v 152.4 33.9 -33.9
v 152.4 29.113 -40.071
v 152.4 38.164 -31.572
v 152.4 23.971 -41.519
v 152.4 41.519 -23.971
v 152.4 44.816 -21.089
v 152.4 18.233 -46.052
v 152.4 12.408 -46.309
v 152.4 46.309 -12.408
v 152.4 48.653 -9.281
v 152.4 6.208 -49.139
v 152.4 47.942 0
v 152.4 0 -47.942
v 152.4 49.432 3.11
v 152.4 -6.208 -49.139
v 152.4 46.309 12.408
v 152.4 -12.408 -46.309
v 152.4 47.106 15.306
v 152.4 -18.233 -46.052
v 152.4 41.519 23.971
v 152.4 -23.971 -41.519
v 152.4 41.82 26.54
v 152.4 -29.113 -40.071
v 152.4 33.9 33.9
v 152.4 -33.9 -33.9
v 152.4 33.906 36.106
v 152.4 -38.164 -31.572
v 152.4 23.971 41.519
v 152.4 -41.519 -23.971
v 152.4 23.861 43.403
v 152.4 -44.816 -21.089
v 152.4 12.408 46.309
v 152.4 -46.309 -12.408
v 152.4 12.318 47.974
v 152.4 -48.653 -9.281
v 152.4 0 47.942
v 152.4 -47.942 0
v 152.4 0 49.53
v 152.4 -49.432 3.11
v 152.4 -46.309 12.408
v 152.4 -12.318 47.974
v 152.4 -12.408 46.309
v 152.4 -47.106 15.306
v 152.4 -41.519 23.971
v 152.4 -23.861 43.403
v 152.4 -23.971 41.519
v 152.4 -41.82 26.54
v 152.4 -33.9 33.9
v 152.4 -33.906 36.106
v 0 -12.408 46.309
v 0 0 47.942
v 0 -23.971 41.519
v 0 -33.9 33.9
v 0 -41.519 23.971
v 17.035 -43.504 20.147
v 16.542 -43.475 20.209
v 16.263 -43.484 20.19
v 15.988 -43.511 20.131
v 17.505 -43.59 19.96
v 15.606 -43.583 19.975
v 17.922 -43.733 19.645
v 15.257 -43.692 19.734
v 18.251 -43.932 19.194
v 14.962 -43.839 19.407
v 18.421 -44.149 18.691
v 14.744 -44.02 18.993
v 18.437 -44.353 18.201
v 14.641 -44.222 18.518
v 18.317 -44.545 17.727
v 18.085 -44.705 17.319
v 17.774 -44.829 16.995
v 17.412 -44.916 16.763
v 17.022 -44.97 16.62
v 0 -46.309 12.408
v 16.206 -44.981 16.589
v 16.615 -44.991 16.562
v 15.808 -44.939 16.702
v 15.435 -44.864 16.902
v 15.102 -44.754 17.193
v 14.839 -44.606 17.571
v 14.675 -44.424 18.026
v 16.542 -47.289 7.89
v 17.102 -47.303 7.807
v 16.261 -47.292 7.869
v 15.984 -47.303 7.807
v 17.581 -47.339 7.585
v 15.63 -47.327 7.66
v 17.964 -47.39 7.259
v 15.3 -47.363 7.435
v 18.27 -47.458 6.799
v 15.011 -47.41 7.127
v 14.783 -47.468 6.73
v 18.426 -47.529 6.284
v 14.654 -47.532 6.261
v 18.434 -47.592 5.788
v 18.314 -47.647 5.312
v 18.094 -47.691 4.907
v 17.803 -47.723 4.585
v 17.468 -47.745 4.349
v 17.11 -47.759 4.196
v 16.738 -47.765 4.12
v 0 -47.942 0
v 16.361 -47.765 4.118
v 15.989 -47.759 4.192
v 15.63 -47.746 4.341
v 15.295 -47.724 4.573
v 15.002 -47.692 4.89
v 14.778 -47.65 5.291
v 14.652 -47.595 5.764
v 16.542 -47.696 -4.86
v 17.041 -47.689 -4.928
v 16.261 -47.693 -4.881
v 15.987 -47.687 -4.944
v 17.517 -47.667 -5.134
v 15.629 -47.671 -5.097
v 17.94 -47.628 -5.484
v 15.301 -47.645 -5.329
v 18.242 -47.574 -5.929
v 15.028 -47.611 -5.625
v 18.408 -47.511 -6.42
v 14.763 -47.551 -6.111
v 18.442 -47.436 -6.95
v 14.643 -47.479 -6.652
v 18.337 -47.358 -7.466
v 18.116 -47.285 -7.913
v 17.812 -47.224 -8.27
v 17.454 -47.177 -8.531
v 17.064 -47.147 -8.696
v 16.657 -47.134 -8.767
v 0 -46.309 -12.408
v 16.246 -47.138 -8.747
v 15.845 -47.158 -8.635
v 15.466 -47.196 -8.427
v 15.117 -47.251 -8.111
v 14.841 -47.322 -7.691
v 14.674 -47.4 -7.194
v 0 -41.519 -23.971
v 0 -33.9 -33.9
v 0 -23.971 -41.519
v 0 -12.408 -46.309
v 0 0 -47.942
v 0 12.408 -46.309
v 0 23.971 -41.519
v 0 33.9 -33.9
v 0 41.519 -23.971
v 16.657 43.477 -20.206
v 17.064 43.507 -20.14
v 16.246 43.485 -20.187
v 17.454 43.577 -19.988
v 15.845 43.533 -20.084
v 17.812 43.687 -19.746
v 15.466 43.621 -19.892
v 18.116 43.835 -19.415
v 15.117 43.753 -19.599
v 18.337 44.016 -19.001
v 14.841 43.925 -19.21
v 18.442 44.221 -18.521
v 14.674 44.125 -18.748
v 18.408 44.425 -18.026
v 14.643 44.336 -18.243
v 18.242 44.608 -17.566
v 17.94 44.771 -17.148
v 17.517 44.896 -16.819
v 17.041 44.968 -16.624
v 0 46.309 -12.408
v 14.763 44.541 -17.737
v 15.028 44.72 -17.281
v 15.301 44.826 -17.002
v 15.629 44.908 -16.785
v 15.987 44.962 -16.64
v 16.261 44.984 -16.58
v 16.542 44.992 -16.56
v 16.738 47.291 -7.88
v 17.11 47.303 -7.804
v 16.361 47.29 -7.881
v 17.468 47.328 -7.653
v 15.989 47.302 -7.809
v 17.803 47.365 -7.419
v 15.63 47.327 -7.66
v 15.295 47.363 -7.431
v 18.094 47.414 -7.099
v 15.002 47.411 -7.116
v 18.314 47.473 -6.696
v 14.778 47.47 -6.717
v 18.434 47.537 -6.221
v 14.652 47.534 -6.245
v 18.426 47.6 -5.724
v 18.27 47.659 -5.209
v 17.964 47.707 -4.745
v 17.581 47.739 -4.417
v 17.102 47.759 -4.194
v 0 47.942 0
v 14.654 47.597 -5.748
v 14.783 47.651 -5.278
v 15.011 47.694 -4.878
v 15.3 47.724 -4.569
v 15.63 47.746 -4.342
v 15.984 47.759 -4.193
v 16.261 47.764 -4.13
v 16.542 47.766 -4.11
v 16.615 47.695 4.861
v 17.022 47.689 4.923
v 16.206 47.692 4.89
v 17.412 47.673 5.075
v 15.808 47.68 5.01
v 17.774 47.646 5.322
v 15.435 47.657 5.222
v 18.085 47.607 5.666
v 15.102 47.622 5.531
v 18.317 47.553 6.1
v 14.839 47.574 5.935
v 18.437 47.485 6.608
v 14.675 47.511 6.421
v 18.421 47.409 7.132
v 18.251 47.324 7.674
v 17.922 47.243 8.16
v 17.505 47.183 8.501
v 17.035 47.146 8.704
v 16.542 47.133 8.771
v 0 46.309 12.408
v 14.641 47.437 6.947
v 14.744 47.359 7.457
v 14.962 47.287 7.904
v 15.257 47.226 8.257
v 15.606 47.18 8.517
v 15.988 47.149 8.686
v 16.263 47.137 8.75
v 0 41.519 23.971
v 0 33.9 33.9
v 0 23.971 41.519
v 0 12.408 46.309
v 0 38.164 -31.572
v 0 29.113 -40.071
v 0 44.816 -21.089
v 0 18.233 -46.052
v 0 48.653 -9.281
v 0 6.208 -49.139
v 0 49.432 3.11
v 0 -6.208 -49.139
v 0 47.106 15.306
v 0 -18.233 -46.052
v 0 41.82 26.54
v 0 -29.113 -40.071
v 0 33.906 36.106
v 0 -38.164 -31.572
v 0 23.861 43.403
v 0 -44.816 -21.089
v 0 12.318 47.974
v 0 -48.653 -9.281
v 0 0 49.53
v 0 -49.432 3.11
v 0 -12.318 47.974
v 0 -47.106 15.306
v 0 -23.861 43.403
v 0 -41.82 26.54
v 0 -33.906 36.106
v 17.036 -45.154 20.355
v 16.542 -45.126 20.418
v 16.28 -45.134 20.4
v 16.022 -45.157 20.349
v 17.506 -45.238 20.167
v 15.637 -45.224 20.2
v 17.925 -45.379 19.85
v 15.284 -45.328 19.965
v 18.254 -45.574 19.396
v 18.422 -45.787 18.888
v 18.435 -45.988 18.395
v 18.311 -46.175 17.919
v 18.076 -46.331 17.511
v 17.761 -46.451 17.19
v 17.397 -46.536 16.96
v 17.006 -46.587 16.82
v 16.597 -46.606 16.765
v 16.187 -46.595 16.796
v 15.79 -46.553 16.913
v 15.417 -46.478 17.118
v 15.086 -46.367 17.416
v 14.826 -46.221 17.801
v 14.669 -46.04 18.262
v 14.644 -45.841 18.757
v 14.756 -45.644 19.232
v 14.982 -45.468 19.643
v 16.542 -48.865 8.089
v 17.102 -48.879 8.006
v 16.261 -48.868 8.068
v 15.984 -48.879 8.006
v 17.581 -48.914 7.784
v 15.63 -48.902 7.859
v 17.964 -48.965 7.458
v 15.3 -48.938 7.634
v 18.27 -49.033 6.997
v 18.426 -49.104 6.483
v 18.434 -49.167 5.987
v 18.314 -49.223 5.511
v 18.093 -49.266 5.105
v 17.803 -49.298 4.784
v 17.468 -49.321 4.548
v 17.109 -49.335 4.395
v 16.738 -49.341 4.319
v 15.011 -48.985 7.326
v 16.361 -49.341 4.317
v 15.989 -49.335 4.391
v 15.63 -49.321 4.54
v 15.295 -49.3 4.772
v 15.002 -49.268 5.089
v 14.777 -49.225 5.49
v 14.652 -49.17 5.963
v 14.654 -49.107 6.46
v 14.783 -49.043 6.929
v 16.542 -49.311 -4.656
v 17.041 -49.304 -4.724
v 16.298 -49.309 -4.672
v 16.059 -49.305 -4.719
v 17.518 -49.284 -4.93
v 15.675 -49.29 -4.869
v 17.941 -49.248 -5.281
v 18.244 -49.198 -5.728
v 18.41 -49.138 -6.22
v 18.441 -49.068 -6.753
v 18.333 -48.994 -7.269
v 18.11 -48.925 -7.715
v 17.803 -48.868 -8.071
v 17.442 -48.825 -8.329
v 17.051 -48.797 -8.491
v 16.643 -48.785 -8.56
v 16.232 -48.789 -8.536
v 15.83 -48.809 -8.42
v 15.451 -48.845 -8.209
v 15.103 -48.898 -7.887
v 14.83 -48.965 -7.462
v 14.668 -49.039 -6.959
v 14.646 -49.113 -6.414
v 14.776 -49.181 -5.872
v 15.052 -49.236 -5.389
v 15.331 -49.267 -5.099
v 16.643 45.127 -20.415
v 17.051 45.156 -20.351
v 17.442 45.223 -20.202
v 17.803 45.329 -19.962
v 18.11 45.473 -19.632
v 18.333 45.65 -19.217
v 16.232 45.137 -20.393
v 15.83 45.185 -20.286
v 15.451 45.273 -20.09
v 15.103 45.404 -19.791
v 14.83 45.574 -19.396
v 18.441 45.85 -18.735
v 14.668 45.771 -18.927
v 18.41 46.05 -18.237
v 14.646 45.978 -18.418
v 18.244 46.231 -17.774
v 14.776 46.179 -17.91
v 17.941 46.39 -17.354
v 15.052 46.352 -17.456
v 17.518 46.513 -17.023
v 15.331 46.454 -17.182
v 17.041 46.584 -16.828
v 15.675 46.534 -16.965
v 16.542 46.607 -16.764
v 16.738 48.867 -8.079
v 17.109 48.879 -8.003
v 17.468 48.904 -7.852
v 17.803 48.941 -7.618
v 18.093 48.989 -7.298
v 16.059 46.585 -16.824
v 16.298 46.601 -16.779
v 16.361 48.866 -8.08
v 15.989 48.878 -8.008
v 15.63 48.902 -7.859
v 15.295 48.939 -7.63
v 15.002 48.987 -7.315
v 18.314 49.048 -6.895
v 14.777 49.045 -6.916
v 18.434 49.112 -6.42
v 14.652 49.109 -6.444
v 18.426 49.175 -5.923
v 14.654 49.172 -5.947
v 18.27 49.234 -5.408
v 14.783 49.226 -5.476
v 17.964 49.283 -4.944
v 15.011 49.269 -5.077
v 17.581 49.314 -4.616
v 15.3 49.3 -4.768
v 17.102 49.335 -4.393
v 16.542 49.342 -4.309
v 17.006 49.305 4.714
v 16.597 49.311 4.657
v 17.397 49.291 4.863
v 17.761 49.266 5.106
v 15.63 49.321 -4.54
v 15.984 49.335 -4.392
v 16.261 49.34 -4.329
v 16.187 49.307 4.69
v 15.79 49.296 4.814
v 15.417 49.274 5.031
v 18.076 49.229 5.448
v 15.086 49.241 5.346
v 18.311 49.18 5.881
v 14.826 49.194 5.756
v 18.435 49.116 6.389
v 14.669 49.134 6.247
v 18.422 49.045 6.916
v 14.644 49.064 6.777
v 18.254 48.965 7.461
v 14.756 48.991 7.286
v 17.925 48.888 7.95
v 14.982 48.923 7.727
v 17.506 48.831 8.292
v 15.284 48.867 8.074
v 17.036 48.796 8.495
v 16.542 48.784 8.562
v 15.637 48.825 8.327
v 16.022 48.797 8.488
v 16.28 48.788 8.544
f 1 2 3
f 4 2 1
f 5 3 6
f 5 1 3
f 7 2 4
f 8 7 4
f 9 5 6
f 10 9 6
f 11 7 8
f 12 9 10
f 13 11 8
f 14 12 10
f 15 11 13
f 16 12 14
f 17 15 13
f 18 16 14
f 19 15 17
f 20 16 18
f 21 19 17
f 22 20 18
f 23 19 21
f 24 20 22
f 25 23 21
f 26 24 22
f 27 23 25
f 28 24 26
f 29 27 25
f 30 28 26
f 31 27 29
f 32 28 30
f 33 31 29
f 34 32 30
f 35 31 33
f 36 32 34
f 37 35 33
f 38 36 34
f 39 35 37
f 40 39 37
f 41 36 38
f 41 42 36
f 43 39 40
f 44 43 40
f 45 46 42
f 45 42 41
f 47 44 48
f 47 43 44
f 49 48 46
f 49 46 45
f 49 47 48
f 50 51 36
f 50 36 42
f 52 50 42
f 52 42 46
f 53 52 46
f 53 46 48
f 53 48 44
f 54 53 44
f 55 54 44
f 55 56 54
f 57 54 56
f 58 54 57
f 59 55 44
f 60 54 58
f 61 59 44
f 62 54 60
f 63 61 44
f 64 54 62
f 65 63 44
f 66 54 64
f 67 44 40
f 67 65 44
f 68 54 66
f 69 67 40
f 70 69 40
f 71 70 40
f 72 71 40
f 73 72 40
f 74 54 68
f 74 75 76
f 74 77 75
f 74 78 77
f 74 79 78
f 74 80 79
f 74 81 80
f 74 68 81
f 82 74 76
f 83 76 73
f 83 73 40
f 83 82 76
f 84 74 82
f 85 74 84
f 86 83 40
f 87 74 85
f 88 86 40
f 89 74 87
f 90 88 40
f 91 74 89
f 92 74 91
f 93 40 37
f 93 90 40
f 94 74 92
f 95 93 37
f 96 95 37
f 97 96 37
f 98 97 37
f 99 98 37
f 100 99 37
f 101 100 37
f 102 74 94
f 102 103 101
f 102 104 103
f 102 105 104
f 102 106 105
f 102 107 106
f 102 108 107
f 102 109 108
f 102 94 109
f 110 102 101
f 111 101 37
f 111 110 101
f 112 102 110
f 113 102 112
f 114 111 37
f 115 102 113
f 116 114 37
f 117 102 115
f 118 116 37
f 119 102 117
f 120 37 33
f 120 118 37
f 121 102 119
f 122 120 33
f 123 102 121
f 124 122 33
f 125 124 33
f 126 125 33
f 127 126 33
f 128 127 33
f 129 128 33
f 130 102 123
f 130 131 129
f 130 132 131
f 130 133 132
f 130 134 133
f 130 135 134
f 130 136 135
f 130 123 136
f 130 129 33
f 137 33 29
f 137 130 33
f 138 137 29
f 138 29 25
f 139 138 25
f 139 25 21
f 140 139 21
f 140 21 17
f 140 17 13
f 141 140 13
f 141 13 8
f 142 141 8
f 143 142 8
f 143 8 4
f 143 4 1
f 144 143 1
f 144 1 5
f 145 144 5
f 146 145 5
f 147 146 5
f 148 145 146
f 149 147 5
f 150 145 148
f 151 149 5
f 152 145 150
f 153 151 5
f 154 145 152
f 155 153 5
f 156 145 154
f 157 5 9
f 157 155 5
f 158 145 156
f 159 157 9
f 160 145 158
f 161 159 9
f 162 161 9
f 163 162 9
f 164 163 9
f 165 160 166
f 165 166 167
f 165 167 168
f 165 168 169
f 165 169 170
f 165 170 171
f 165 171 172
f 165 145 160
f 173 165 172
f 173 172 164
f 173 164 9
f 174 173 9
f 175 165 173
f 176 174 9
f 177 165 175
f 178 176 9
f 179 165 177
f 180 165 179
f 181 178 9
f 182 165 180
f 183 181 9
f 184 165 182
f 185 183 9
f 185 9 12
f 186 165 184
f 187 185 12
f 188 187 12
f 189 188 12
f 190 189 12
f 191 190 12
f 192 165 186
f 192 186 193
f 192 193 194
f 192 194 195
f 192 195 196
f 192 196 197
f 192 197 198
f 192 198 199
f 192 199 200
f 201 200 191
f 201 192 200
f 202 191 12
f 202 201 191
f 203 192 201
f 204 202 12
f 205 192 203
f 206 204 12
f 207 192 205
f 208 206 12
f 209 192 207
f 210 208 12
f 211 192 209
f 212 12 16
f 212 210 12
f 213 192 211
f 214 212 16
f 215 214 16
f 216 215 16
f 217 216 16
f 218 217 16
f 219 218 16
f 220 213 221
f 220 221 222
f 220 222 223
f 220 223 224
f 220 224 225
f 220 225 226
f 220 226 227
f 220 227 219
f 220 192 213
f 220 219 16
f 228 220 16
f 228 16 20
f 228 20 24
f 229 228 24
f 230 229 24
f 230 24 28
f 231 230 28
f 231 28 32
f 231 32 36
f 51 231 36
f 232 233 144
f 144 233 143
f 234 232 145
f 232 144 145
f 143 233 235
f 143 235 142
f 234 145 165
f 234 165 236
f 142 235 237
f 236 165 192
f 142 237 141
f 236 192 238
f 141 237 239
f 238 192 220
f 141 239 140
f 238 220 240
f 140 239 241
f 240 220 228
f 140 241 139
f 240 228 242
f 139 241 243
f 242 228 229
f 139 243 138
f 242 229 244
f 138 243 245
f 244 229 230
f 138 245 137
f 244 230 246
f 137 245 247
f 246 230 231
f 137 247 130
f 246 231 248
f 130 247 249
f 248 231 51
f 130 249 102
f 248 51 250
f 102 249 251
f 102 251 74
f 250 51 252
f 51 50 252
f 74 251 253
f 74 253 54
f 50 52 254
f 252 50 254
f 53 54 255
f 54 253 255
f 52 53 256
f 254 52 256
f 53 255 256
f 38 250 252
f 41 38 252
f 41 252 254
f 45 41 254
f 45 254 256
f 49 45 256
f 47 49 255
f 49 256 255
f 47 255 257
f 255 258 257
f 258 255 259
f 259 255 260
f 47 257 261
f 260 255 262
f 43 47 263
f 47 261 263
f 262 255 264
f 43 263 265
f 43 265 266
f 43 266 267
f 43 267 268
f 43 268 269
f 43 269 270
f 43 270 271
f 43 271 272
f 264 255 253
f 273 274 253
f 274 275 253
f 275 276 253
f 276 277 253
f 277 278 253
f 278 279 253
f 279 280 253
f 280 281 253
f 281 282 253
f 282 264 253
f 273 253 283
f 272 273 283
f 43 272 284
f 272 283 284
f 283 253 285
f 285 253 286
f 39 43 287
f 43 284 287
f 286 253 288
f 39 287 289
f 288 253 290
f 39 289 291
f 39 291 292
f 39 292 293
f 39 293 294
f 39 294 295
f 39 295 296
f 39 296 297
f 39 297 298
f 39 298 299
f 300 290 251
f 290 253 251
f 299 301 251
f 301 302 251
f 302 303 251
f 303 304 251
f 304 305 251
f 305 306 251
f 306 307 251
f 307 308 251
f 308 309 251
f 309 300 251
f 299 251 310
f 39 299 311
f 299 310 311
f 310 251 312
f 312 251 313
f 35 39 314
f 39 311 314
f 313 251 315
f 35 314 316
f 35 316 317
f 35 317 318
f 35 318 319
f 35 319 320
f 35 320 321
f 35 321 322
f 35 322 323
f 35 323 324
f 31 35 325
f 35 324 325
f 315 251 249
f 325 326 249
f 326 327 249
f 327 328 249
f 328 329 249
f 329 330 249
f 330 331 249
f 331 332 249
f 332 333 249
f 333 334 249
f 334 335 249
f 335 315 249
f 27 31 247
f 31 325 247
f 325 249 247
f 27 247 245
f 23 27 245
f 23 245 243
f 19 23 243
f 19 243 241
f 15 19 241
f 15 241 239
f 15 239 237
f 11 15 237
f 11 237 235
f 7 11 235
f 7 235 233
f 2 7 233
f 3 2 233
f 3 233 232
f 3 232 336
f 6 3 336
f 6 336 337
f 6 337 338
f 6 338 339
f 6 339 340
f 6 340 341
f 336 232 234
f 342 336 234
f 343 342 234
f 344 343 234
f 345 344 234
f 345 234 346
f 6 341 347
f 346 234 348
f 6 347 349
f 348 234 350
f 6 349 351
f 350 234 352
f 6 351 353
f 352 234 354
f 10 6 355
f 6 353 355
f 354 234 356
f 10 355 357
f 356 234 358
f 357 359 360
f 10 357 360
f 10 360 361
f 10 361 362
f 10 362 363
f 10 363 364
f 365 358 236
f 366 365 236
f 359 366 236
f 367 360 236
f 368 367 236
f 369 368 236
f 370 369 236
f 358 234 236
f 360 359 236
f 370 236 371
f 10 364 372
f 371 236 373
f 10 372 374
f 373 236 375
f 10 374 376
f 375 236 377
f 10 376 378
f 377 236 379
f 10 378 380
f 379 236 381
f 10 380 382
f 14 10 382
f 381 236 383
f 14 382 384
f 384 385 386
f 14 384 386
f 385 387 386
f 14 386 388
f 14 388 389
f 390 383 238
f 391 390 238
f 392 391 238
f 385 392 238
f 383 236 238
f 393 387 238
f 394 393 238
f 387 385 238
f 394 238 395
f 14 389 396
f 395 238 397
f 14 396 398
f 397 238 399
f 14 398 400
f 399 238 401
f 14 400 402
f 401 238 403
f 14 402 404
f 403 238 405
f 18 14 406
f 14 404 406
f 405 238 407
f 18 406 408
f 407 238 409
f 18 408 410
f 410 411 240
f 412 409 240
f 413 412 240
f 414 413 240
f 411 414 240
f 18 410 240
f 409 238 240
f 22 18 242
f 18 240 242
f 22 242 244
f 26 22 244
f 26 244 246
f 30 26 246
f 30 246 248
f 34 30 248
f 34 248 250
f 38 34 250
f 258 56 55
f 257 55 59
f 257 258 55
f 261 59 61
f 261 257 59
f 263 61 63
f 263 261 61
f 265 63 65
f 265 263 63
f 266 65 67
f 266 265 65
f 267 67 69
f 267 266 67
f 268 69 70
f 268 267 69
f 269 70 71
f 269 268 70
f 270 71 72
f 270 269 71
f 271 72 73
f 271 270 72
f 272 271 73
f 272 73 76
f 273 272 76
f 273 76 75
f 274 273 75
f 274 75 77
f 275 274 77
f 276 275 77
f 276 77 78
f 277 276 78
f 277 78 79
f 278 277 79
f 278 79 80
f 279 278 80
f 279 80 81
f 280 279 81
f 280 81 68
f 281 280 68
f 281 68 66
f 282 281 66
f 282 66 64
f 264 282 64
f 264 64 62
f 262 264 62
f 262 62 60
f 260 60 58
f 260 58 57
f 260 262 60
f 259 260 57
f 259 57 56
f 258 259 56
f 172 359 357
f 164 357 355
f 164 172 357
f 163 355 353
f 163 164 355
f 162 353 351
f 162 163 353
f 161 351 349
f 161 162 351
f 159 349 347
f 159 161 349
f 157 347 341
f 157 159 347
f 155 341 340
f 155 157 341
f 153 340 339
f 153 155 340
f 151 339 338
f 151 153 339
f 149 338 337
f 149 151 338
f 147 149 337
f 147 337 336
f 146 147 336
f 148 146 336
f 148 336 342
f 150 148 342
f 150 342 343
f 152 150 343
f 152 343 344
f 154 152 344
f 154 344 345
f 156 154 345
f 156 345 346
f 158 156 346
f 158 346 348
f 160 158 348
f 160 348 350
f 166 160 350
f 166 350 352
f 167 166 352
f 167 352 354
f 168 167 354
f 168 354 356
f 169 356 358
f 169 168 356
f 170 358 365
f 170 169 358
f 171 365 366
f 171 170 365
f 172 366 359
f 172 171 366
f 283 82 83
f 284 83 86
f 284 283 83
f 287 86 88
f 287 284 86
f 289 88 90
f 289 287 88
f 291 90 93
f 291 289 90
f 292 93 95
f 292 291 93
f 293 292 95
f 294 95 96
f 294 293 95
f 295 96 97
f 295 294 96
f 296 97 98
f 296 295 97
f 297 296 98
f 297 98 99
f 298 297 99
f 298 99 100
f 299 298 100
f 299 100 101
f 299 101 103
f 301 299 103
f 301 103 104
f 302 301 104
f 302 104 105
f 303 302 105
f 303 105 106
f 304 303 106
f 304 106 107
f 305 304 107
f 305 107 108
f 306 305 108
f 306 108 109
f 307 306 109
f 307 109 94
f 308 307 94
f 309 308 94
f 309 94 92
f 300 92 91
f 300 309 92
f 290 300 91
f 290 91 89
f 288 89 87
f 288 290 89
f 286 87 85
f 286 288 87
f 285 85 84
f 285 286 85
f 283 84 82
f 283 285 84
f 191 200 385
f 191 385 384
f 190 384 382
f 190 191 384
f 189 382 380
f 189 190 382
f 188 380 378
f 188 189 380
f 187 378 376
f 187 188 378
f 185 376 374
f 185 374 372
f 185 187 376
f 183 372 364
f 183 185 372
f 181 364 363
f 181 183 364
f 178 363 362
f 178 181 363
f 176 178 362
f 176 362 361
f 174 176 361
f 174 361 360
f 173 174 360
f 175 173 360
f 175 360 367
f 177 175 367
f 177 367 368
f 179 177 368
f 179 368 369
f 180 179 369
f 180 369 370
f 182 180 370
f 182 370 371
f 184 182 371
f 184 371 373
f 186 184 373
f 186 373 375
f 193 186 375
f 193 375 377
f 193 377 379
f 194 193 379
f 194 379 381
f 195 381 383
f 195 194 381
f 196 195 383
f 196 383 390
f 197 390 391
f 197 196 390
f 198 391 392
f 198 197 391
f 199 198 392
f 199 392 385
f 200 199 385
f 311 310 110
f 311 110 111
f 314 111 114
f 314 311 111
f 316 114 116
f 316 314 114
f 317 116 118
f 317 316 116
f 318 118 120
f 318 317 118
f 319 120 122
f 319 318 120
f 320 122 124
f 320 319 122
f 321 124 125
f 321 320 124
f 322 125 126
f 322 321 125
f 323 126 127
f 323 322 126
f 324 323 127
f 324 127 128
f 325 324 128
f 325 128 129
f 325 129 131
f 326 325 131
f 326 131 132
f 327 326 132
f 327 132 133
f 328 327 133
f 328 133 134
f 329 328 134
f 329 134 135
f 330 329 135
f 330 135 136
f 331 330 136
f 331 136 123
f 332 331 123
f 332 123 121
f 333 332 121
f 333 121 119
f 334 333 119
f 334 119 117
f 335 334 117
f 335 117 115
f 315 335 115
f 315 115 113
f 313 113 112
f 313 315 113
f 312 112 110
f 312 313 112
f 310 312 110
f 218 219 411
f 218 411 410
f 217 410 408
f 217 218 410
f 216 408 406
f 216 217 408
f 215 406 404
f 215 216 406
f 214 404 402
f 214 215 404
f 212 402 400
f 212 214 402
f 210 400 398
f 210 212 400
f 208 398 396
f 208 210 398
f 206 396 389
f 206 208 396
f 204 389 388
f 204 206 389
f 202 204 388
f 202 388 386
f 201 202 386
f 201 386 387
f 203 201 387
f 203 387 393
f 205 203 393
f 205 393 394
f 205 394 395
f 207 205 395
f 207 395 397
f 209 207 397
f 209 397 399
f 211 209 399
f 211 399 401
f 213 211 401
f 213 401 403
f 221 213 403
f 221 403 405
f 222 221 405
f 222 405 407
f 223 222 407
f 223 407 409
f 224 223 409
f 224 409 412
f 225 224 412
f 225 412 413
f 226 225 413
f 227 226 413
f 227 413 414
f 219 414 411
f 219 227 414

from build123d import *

# Parameters (mm, degrees)
SKETCH1_R               = 49.53
SKETCH1_R_2             = 47.9425
BOSS_EXTRUDE1_DEPTH     = 152.4
CUT_EXTRUDE1_DEPTH      = 642.495475246
CUT_EXTRUDE1_DEPTH_BACK = 642.495475246
SKETCH2_R               = 1.905


with BuildPart() as part:
    # Sketch1 → Boss-Extrude1 (new body)
    with BuildSketch(Plane(origin=(0, 0, 0), x_dir=(0, 0, -1), z_dir=(1, 0, 0))):
        with Locations(Location((0, 0, 0), (0, 0, 180))):
            Circle(SKETCH1_R)
        with Locations(Location((0, 0, 0), (0, 0, 180))):
            Circle(SKETCH1_R_2, mode=Mode.SUBTRACT)
    extrude(amount=BOSS_EXTRUDE1_DEPTH)

    # Sketch2 → Cut-Extrude1 (cut, two sides: drawn at the far end of the back side and taken through both)
    with BuildSketch(Plane(origin=(-485.259786219, 0, 0), x_dir=(0, 0.12524438136346008, 0.9921259219156024), z_dir=(0, 0.9921259219156026, -0.12524438136346008)).offset(-CUT_EXTRUDE1_DEPTH_BACK)):
        with Locations((12.7, 501.801536219)):
            Circle(SKETCH2_R)
        with Locations((0, 501.801536219)):
            Circle(SKETCH2_R)
        with Locations((-12.7, 501.801536219)):
            Circle(SKETCH2_R)
    extrude(amount=CUT_EXTRUDE1_DEPTH + CUT_EXTRUDE1_DEPTH_BACK, mode=Mode.SUBTRACT)


solid = part.part
